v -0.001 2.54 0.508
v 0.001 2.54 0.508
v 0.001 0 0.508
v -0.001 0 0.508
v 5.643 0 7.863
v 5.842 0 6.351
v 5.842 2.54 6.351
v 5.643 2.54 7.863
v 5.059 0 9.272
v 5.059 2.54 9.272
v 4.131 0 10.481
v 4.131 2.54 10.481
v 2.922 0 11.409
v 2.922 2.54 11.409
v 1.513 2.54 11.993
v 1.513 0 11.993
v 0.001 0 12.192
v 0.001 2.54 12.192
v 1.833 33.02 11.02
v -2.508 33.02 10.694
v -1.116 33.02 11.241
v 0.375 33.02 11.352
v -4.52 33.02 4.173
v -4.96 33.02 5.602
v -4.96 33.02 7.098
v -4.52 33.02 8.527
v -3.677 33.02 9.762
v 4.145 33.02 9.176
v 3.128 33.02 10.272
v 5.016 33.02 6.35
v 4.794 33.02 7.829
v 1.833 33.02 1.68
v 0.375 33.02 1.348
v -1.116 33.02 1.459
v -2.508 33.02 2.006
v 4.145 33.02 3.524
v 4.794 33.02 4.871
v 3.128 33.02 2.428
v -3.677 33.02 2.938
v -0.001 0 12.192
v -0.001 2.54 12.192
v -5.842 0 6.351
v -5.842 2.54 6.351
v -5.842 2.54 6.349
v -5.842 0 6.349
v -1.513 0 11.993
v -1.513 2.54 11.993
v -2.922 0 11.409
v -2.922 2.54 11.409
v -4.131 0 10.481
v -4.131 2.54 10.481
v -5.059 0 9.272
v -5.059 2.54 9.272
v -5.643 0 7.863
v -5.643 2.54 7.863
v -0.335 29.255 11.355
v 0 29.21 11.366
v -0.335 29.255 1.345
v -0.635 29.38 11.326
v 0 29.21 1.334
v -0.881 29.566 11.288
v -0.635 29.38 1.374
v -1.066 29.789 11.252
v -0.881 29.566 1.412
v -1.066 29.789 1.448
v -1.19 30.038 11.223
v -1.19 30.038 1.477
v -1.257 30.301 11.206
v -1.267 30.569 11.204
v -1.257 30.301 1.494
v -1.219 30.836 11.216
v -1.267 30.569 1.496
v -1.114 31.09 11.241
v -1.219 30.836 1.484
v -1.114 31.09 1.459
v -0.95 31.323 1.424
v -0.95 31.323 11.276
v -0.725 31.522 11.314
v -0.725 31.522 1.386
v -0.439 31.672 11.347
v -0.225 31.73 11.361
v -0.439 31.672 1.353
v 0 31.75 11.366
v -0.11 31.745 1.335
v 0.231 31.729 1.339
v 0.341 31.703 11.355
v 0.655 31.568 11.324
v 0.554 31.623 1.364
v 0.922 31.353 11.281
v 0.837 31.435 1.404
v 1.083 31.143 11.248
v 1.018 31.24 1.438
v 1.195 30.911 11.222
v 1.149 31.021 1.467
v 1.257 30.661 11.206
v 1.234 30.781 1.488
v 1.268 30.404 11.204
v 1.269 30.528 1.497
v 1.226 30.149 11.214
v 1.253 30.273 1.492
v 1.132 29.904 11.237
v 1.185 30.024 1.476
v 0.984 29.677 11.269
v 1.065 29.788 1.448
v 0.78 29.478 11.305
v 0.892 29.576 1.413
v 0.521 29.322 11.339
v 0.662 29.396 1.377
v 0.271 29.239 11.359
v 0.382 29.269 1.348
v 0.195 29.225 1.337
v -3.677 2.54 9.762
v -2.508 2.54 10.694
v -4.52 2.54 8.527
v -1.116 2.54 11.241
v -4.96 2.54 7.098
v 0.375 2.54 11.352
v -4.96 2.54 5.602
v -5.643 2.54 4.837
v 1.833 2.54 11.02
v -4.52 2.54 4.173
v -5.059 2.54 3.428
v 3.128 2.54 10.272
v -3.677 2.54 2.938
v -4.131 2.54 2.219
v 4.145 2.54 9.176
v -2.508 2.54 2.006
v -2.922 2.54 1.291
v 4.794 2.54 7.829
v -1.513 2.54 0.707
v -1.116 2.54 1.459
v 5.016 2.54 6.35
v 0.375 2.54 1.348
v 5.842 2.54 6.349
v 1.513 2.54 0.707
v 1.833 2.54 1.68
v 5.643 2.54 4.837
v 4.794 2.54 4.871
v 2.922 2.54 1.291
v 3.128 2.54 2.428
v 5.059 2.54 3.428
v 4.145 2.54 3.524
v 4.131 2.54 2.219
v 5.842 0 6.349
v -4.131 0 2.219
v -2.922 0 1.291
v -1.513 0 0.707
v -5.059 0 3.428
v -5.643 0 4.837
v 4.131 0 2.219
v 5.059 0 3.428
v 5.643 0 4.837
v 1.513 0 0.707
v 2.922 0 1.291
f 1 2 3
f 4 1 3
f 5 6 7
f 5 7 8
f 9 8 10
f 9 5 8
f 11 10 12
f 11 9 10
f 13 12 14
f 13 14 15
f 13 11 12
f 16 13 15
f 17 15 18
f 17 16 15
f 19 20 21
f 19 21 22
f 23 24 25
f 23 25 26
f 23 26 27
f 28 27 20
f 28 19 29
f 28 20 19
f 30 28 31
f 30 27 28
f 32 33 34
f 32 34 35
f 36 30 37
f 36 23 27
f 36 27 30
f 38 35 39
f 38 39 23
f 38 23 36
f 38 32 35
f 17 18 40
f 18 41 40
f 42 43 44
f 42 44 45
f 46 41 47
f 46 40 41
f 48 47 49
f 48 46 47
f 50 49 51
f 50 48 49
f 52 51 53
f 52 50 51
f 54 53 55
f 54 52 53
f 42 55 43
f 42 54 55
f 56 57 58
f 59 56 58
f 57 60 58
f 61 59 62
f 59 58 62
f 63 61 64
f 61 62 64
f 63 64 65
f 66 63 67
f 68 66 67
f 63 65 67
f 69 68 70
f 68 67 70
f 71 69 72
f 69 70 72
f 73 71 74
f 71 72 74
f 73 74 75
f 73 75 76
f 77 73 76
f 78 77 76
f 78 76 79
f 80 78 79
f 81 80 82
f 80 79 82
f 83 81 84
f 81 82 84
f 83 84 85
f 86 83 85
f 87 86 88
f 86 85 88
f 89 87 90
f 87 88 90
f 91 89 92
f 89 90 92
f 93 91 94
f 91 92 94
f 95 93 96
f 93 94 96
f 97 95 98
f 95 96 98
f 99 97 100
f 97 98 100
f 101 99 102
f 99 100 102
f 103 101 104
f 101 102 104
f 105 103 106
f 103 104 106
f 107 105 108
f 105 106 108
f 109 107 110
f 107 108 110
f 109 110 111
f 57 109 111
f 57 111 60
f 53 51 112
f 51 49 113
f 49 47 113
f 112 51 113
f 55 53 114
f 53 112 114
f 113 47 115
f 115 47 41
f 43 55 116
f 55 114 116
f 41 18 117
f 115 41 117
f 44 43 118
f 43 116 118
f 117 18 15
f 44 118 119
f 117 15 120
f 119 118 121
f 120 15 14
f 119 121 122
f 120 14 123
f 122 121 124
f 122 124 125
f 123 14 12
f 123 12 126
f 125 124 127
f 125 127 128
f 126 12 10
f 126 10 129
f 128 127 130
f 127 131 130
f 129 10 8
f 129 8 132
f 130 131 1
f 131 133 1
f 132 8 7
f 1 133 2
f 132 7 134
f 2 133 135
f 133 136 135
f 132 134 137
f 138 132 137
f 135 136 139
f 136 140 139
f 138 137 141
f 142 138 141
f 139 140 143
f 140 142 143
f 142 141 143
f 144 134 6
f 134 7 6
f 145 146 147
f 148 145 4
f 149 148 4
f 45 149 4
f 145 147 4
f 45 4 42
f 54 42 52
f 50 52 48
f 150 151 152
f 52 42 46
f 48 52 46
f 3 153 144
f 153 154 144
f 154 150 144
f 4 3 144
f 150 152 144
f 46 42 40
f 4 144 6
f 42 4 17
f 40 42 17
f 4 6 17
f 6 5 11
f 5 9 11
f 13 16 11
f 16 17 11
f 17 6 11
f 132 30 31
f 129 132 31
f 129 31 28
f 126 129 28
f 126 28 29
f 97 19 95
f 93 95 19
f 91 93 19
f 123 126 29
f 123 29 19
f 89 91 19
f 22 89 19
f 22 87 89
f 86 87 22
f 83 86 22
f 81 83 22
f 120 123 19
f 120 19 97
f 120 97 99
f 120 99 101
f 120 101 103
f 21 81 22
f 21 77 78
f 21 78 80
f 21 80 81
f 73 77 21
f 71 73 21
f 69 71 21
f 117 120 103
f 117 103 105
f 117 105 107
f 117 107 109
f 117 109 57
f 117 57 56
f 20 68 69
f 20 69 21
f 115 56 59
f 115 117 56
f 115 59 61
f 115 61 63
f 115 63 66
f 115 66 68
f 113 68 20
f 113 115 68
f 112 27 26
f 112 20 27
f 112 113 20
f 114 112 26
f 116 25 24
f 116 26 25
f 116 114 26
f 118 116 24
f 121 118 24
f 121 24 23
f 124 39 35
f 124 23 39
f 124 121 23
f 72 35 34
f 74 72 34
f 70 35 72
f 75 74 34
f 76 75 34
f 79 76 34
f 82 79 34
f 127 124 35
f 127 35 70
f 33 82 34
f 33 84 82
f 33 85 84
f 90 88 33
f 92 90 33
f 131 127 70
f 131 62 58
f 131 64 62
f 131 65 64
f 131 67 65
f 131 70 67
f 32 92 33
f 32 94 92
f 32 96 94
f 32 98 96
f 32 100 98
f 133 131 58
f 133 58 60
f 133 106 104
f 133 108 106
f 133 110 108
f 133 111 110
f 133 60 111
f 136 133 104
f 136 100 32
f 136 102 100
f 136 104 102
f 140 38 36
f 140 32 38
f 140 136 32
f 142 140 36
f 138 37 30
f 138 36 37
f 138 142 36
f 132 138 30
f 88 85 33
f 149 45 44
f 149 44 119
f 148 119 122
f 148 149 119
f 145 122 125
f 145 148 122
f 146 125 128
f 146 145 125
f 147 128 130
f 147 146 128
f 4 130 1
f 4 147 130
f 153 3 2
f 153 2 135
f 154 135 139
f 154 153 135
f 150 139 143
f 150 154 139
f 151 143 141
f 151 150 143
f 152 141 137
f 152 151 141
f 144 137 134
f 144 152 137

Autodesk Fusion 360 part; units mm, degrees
sketch "Sketch1" plane through (0, 0, 0) normal (0, 1, 0) x (1, 0, 0)
  circle A0 centre (0, -6.35) radius 5.0165
  dimension "d1" = 10.033
extrude "Extrude1" add sketch "Sketch1" along normal blind 33.02
hole "Hole1" at (0, 55.245, 11.3665) direction (0, 0, -1) diameter 2.54 depth 19.05 tip angle 118
extrude "Extrude2" cut 1 faces at (-0.3721, 0, 4.7198) along direction (0, 1, 0) blind 2.54
sketch "Sketch3" plane through (0, 2.54, 0) normal (0, -1, 0) x (1, 0, 0)
  circle A0 centre (0, 6.35) radius 5.0165
  line L0 (-2.54, 8.89) -> (2.54, 8.89)
  line L1 (2.54, 8.89) -> (2.54, 3.81)
  line L2 (2.54, 3.81) -> (-2.54, 3.81)
  line L3 (-2.54, 3.81) -> (-2.54, 8.89)
extrude "Extrude3" add sketch "Sketch3" along normal blind 2.54 contours L0 L1 L2 L3
extrude "Extrude4" add 1 faces at (0.8467, 0.8467, 8.89) along direction (0, 0, 1) blind 3.302
extrude "Extrude5" add 1 faces at (2.54, 0.8467, 8.8926) along direction (1, 0, 0) blind 3.302
extrude "Extrude6" add 1 faces at (2.5426, 0.8467, 3.81) along direction (0, 0, -1) blind 3.302
extrude "Extrude7" add 1 faces at (-2.54, 0.8467, 4.908) along direction (-1, 0, 0) blind 3.302
fillet "Fillet1" radius 5.842 4 edges at (-5.842, 1.27, 12.192) (5.842, 1.27, 12.192) (5.842, 1.27, 0.508) (-5.842, 1.27, 0.508)
hole "Hole2" at (0, 30.48, 11.3665) direction (0, 0, -1) diameter 2.54 depth 23.622 tip angle 118
